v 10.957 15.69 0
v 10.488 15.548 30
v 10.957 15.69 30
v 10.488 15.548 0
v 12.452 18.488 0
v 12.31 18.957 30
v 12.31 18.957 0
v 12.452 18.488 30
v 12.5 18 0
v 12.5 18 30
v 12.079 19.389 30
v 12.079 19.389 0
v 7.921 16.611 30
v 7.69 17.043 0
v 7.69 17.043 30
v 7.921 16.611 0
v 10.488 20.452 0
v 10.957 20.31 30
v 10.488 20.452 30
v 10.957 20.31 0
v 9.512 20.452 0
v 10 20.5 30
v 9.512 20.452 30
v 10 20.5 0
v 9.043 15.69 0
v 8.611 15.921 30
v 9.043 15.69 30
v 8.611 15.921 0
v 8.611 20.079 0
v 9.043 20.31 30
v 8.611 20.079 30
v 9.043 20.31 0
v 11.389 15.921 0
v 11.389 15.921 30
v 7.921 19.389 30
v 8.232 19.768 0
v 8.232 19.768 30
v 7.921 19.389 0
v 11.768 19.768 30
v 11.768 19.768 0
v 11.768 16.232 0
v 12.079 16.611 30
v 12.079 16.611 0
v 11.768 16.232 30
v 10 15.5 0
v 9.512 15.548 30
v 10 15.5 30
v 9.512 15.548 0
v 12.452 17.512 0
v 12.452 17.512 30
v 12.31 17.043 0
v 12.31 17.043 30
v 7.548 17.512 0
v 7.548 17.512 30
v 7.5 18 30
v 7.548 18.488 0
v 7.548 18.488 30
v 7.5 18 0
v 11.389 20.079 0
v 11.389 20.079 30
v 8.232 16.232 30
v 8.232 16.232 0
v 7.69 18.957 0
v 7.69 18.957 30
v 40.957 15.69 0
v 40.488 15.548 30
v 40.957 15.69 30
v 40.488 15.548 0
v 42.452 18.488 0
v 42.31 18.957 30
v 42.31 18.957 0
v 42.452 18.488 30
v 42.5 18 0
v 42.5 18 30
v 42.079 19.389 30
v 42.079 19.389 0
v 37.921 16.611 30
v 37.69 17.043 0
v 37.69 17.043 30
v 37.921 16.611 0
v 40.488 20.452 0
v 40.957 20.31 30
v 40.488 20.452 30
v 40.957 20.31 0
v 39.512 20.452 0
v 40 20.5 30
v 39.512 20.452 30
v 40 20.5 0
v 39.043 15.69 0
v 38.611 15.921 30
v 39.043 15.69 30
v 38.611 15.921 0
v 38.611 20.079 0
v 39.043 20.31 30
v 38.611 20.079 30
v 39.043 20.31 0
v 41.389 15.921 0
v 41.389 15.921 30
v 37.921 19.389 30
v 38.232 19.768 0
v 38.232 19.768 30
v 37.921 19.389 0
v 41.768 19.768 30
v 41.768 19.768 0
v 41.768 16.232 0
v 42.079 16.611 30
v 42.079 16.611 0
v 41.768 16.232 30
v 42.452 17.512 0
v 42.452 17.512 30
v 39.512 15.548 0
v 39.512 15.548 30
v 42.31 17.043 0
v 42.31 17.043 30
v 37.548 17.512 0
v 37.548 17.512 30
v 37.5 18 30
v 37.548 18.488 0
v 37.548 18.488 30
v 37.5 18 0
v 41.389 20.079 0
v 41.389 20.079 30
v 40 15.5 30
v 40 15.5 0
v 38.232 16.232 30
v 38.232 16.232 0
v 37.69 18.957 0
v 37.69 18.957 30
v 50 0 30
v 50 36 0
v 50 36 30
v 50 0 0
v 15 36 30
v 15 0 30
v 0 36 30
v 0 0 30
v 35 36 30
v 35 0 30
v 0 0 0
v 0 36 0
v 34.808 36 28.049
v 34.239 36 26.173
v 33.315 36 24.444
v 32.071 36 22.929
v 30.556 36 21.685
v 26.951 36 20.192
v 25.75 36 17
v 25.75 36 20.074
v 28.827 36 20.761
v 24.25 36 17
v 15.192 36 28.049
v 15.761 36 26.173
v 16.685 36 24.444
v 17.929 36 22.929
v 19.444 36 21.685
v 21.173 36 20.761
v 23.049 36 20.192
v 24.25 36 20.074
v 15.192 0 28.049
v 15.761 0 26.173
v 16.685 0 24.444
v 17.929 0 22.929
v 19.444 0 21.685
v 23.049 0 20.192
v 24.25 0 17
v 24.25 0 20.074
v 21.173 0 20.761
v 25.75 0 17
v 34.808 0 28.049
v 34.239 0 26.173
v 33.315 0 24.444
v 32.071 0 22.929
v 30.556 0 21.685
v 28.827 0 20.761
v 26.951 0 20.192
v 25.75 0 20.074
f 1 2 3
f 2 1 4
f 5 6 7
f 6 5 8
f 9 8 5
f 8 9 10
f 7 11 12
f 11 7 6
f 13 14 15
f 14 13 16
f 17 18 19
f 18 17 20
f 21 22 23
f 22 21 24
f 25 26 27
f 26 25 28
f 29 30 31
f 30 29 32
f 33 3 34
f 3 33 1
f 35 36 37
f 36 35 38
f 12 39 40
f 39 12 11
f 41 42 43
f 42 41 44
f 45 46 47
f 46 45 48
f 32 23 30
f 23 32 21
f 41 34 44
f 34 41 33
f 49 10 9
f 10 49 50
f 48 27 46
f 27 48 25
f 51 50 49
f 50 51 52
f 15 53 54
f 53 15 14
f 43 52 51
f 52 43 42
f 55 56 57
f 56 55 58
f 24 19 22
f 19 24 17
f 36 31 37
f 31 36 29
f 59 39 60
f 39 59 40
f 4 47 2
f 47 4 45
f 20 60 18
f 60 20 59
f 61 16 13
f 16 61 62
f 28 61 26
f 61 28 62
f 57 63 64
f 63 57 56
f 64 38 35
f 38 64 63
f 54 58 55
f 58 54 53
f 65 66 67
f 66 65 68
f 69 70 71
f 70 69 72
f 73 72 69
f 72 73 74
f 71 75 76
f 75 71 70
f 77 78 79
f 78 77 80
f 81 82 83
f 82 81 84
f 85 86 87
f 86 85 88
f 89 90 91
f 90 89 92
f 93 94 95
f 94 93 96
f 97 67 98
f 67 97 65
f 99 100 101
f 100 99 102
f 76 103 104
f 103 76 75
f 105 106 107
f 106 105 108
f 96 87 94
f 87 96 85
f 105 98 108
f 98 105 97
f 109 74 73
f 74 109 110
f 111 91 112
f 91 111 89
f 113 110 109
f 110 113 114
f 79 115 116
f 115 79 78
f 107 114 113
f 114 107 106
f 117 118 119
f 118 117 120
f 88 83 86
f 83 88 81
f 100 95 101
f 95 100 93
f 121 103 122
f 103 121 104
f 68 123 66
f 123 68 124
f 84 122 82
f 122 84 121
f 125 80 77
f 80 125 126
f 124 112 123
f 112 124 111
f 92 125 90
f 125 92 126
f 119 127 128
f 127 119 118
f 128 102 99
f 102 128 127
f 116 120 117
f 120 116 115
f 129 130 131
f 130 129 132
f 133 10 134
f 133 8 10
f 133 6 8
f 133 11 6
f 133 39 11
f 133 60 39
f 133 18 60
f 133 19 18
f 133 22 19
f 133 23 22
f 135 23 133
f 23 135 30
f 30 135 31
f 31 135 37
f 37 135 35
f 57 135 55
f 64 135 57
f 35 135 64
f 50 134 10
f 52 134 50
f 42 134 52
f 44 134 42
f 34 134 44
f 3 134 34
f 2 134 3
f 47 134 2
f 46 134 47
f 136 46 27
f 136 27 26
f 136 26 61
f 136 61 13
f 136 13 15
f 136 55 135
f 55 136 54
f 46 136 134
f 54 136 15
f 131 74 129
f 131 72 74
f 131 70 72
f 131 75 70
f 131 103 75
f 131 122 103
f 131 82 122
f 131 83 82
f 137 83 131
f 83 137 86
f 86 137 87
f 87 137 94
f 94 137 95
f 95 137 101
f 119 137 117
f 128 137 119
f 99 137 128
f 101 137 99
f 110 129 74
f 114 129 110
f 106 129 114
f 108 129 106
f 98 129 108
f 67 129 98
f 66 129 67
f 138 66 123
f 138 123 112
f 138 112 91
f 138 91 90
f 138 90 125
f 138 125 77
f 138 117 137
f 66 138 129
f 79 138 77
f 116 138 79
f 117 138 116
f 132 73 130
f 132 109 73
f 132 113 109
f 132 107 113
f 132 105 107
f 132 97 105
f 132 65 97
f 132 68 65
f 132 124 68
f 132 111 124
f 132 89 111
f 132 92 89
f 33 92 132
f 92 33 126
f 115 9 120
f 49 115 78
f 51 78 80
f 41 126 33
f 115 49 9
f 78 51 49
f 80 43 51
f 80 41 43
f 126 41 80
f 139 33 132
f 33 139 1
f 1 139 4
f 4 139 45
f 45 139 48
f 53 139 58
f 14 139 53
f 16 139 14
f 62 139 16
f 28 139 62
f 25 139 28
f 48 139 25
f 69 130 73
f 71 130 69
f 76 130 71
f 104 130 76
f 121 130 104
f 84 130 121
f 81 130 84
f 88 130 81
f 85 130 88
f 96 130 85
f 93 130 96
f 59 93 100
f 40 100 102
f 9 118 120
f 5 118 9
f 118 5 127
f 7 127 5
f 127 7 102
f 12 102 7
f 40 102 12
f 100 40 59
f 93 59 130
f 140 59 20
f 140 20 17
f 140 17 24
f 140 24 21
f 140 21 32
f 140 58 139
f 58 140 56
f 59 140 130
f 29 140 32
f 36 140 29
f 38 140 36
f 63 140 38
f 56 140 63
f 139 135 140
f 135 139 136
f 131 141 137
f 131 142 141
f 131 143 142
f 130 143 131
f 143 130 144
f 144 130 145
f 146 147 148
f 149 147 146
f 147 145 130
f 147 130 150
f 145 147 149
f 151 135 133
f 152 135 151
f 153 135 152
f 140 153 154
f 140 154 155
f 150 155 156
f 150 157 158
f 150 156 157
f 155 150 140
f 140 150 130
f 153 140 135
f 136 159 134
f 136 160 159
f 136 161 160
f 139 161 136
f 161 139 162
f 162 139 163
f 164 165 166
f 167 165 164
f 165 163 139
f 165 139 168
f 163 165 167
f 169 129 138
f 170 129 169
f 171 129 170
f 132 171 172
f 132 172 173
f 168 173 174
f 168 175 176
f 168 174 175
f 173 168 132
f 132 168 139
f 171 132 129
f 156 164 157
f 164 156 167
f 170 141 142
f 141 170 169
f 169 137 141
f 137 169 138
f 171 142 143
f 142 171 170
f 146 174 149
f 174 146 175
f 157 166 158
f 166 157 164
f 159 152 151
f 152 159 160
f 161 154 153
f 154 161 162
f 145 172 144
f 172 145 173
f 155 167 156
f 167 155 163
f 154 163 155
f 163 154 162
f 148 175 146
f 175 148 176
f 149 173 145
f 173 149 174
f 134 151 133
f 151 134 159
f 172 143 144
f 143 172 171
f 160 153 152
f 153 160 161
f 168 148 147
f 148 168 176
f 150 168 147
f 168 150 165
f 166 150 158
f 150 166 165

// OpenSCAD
$fn = 32;

// ----------------------------------------------------------------------
// Saddle clamp: split shaft clamp
// ----------------------------------------------------------------------

// --- parameters (mm) ---
blk_l = 50;               // block length, X
blk_w = 36;               // block width, Y
blk_h = 30;               // block height
clamp_r = 10;             // shaft groove radius
hole_r = 2.5;             // bolt hole radius
hole_m = 10;              // bolt hole margin from the ends
saw_w = 1.5;              // saw kerf width

saw_depth = clamp_r + 3;  // saw kerf depth

difference() {
  cube([blk_l, blk_w, blk_h]);
  translate([blk_l / 2, -1, blk_h])
    rotate([-90, 0, 0])
      cylinder(h = blk_w + 2, r = clamp_r);
  for (sx = [0, 1])
    translate([sx ? blk_l - hole_m : hole_m, blk_w / 2, -1])
      cylinder(r = hole_r, h = blk_h + 2);
  translate([blk_l / 2 - saw_w / 2, -1, blk_h - saw_depth])
    cube([saw_w, blk_w + 2, saw_depth + 1]);
}
